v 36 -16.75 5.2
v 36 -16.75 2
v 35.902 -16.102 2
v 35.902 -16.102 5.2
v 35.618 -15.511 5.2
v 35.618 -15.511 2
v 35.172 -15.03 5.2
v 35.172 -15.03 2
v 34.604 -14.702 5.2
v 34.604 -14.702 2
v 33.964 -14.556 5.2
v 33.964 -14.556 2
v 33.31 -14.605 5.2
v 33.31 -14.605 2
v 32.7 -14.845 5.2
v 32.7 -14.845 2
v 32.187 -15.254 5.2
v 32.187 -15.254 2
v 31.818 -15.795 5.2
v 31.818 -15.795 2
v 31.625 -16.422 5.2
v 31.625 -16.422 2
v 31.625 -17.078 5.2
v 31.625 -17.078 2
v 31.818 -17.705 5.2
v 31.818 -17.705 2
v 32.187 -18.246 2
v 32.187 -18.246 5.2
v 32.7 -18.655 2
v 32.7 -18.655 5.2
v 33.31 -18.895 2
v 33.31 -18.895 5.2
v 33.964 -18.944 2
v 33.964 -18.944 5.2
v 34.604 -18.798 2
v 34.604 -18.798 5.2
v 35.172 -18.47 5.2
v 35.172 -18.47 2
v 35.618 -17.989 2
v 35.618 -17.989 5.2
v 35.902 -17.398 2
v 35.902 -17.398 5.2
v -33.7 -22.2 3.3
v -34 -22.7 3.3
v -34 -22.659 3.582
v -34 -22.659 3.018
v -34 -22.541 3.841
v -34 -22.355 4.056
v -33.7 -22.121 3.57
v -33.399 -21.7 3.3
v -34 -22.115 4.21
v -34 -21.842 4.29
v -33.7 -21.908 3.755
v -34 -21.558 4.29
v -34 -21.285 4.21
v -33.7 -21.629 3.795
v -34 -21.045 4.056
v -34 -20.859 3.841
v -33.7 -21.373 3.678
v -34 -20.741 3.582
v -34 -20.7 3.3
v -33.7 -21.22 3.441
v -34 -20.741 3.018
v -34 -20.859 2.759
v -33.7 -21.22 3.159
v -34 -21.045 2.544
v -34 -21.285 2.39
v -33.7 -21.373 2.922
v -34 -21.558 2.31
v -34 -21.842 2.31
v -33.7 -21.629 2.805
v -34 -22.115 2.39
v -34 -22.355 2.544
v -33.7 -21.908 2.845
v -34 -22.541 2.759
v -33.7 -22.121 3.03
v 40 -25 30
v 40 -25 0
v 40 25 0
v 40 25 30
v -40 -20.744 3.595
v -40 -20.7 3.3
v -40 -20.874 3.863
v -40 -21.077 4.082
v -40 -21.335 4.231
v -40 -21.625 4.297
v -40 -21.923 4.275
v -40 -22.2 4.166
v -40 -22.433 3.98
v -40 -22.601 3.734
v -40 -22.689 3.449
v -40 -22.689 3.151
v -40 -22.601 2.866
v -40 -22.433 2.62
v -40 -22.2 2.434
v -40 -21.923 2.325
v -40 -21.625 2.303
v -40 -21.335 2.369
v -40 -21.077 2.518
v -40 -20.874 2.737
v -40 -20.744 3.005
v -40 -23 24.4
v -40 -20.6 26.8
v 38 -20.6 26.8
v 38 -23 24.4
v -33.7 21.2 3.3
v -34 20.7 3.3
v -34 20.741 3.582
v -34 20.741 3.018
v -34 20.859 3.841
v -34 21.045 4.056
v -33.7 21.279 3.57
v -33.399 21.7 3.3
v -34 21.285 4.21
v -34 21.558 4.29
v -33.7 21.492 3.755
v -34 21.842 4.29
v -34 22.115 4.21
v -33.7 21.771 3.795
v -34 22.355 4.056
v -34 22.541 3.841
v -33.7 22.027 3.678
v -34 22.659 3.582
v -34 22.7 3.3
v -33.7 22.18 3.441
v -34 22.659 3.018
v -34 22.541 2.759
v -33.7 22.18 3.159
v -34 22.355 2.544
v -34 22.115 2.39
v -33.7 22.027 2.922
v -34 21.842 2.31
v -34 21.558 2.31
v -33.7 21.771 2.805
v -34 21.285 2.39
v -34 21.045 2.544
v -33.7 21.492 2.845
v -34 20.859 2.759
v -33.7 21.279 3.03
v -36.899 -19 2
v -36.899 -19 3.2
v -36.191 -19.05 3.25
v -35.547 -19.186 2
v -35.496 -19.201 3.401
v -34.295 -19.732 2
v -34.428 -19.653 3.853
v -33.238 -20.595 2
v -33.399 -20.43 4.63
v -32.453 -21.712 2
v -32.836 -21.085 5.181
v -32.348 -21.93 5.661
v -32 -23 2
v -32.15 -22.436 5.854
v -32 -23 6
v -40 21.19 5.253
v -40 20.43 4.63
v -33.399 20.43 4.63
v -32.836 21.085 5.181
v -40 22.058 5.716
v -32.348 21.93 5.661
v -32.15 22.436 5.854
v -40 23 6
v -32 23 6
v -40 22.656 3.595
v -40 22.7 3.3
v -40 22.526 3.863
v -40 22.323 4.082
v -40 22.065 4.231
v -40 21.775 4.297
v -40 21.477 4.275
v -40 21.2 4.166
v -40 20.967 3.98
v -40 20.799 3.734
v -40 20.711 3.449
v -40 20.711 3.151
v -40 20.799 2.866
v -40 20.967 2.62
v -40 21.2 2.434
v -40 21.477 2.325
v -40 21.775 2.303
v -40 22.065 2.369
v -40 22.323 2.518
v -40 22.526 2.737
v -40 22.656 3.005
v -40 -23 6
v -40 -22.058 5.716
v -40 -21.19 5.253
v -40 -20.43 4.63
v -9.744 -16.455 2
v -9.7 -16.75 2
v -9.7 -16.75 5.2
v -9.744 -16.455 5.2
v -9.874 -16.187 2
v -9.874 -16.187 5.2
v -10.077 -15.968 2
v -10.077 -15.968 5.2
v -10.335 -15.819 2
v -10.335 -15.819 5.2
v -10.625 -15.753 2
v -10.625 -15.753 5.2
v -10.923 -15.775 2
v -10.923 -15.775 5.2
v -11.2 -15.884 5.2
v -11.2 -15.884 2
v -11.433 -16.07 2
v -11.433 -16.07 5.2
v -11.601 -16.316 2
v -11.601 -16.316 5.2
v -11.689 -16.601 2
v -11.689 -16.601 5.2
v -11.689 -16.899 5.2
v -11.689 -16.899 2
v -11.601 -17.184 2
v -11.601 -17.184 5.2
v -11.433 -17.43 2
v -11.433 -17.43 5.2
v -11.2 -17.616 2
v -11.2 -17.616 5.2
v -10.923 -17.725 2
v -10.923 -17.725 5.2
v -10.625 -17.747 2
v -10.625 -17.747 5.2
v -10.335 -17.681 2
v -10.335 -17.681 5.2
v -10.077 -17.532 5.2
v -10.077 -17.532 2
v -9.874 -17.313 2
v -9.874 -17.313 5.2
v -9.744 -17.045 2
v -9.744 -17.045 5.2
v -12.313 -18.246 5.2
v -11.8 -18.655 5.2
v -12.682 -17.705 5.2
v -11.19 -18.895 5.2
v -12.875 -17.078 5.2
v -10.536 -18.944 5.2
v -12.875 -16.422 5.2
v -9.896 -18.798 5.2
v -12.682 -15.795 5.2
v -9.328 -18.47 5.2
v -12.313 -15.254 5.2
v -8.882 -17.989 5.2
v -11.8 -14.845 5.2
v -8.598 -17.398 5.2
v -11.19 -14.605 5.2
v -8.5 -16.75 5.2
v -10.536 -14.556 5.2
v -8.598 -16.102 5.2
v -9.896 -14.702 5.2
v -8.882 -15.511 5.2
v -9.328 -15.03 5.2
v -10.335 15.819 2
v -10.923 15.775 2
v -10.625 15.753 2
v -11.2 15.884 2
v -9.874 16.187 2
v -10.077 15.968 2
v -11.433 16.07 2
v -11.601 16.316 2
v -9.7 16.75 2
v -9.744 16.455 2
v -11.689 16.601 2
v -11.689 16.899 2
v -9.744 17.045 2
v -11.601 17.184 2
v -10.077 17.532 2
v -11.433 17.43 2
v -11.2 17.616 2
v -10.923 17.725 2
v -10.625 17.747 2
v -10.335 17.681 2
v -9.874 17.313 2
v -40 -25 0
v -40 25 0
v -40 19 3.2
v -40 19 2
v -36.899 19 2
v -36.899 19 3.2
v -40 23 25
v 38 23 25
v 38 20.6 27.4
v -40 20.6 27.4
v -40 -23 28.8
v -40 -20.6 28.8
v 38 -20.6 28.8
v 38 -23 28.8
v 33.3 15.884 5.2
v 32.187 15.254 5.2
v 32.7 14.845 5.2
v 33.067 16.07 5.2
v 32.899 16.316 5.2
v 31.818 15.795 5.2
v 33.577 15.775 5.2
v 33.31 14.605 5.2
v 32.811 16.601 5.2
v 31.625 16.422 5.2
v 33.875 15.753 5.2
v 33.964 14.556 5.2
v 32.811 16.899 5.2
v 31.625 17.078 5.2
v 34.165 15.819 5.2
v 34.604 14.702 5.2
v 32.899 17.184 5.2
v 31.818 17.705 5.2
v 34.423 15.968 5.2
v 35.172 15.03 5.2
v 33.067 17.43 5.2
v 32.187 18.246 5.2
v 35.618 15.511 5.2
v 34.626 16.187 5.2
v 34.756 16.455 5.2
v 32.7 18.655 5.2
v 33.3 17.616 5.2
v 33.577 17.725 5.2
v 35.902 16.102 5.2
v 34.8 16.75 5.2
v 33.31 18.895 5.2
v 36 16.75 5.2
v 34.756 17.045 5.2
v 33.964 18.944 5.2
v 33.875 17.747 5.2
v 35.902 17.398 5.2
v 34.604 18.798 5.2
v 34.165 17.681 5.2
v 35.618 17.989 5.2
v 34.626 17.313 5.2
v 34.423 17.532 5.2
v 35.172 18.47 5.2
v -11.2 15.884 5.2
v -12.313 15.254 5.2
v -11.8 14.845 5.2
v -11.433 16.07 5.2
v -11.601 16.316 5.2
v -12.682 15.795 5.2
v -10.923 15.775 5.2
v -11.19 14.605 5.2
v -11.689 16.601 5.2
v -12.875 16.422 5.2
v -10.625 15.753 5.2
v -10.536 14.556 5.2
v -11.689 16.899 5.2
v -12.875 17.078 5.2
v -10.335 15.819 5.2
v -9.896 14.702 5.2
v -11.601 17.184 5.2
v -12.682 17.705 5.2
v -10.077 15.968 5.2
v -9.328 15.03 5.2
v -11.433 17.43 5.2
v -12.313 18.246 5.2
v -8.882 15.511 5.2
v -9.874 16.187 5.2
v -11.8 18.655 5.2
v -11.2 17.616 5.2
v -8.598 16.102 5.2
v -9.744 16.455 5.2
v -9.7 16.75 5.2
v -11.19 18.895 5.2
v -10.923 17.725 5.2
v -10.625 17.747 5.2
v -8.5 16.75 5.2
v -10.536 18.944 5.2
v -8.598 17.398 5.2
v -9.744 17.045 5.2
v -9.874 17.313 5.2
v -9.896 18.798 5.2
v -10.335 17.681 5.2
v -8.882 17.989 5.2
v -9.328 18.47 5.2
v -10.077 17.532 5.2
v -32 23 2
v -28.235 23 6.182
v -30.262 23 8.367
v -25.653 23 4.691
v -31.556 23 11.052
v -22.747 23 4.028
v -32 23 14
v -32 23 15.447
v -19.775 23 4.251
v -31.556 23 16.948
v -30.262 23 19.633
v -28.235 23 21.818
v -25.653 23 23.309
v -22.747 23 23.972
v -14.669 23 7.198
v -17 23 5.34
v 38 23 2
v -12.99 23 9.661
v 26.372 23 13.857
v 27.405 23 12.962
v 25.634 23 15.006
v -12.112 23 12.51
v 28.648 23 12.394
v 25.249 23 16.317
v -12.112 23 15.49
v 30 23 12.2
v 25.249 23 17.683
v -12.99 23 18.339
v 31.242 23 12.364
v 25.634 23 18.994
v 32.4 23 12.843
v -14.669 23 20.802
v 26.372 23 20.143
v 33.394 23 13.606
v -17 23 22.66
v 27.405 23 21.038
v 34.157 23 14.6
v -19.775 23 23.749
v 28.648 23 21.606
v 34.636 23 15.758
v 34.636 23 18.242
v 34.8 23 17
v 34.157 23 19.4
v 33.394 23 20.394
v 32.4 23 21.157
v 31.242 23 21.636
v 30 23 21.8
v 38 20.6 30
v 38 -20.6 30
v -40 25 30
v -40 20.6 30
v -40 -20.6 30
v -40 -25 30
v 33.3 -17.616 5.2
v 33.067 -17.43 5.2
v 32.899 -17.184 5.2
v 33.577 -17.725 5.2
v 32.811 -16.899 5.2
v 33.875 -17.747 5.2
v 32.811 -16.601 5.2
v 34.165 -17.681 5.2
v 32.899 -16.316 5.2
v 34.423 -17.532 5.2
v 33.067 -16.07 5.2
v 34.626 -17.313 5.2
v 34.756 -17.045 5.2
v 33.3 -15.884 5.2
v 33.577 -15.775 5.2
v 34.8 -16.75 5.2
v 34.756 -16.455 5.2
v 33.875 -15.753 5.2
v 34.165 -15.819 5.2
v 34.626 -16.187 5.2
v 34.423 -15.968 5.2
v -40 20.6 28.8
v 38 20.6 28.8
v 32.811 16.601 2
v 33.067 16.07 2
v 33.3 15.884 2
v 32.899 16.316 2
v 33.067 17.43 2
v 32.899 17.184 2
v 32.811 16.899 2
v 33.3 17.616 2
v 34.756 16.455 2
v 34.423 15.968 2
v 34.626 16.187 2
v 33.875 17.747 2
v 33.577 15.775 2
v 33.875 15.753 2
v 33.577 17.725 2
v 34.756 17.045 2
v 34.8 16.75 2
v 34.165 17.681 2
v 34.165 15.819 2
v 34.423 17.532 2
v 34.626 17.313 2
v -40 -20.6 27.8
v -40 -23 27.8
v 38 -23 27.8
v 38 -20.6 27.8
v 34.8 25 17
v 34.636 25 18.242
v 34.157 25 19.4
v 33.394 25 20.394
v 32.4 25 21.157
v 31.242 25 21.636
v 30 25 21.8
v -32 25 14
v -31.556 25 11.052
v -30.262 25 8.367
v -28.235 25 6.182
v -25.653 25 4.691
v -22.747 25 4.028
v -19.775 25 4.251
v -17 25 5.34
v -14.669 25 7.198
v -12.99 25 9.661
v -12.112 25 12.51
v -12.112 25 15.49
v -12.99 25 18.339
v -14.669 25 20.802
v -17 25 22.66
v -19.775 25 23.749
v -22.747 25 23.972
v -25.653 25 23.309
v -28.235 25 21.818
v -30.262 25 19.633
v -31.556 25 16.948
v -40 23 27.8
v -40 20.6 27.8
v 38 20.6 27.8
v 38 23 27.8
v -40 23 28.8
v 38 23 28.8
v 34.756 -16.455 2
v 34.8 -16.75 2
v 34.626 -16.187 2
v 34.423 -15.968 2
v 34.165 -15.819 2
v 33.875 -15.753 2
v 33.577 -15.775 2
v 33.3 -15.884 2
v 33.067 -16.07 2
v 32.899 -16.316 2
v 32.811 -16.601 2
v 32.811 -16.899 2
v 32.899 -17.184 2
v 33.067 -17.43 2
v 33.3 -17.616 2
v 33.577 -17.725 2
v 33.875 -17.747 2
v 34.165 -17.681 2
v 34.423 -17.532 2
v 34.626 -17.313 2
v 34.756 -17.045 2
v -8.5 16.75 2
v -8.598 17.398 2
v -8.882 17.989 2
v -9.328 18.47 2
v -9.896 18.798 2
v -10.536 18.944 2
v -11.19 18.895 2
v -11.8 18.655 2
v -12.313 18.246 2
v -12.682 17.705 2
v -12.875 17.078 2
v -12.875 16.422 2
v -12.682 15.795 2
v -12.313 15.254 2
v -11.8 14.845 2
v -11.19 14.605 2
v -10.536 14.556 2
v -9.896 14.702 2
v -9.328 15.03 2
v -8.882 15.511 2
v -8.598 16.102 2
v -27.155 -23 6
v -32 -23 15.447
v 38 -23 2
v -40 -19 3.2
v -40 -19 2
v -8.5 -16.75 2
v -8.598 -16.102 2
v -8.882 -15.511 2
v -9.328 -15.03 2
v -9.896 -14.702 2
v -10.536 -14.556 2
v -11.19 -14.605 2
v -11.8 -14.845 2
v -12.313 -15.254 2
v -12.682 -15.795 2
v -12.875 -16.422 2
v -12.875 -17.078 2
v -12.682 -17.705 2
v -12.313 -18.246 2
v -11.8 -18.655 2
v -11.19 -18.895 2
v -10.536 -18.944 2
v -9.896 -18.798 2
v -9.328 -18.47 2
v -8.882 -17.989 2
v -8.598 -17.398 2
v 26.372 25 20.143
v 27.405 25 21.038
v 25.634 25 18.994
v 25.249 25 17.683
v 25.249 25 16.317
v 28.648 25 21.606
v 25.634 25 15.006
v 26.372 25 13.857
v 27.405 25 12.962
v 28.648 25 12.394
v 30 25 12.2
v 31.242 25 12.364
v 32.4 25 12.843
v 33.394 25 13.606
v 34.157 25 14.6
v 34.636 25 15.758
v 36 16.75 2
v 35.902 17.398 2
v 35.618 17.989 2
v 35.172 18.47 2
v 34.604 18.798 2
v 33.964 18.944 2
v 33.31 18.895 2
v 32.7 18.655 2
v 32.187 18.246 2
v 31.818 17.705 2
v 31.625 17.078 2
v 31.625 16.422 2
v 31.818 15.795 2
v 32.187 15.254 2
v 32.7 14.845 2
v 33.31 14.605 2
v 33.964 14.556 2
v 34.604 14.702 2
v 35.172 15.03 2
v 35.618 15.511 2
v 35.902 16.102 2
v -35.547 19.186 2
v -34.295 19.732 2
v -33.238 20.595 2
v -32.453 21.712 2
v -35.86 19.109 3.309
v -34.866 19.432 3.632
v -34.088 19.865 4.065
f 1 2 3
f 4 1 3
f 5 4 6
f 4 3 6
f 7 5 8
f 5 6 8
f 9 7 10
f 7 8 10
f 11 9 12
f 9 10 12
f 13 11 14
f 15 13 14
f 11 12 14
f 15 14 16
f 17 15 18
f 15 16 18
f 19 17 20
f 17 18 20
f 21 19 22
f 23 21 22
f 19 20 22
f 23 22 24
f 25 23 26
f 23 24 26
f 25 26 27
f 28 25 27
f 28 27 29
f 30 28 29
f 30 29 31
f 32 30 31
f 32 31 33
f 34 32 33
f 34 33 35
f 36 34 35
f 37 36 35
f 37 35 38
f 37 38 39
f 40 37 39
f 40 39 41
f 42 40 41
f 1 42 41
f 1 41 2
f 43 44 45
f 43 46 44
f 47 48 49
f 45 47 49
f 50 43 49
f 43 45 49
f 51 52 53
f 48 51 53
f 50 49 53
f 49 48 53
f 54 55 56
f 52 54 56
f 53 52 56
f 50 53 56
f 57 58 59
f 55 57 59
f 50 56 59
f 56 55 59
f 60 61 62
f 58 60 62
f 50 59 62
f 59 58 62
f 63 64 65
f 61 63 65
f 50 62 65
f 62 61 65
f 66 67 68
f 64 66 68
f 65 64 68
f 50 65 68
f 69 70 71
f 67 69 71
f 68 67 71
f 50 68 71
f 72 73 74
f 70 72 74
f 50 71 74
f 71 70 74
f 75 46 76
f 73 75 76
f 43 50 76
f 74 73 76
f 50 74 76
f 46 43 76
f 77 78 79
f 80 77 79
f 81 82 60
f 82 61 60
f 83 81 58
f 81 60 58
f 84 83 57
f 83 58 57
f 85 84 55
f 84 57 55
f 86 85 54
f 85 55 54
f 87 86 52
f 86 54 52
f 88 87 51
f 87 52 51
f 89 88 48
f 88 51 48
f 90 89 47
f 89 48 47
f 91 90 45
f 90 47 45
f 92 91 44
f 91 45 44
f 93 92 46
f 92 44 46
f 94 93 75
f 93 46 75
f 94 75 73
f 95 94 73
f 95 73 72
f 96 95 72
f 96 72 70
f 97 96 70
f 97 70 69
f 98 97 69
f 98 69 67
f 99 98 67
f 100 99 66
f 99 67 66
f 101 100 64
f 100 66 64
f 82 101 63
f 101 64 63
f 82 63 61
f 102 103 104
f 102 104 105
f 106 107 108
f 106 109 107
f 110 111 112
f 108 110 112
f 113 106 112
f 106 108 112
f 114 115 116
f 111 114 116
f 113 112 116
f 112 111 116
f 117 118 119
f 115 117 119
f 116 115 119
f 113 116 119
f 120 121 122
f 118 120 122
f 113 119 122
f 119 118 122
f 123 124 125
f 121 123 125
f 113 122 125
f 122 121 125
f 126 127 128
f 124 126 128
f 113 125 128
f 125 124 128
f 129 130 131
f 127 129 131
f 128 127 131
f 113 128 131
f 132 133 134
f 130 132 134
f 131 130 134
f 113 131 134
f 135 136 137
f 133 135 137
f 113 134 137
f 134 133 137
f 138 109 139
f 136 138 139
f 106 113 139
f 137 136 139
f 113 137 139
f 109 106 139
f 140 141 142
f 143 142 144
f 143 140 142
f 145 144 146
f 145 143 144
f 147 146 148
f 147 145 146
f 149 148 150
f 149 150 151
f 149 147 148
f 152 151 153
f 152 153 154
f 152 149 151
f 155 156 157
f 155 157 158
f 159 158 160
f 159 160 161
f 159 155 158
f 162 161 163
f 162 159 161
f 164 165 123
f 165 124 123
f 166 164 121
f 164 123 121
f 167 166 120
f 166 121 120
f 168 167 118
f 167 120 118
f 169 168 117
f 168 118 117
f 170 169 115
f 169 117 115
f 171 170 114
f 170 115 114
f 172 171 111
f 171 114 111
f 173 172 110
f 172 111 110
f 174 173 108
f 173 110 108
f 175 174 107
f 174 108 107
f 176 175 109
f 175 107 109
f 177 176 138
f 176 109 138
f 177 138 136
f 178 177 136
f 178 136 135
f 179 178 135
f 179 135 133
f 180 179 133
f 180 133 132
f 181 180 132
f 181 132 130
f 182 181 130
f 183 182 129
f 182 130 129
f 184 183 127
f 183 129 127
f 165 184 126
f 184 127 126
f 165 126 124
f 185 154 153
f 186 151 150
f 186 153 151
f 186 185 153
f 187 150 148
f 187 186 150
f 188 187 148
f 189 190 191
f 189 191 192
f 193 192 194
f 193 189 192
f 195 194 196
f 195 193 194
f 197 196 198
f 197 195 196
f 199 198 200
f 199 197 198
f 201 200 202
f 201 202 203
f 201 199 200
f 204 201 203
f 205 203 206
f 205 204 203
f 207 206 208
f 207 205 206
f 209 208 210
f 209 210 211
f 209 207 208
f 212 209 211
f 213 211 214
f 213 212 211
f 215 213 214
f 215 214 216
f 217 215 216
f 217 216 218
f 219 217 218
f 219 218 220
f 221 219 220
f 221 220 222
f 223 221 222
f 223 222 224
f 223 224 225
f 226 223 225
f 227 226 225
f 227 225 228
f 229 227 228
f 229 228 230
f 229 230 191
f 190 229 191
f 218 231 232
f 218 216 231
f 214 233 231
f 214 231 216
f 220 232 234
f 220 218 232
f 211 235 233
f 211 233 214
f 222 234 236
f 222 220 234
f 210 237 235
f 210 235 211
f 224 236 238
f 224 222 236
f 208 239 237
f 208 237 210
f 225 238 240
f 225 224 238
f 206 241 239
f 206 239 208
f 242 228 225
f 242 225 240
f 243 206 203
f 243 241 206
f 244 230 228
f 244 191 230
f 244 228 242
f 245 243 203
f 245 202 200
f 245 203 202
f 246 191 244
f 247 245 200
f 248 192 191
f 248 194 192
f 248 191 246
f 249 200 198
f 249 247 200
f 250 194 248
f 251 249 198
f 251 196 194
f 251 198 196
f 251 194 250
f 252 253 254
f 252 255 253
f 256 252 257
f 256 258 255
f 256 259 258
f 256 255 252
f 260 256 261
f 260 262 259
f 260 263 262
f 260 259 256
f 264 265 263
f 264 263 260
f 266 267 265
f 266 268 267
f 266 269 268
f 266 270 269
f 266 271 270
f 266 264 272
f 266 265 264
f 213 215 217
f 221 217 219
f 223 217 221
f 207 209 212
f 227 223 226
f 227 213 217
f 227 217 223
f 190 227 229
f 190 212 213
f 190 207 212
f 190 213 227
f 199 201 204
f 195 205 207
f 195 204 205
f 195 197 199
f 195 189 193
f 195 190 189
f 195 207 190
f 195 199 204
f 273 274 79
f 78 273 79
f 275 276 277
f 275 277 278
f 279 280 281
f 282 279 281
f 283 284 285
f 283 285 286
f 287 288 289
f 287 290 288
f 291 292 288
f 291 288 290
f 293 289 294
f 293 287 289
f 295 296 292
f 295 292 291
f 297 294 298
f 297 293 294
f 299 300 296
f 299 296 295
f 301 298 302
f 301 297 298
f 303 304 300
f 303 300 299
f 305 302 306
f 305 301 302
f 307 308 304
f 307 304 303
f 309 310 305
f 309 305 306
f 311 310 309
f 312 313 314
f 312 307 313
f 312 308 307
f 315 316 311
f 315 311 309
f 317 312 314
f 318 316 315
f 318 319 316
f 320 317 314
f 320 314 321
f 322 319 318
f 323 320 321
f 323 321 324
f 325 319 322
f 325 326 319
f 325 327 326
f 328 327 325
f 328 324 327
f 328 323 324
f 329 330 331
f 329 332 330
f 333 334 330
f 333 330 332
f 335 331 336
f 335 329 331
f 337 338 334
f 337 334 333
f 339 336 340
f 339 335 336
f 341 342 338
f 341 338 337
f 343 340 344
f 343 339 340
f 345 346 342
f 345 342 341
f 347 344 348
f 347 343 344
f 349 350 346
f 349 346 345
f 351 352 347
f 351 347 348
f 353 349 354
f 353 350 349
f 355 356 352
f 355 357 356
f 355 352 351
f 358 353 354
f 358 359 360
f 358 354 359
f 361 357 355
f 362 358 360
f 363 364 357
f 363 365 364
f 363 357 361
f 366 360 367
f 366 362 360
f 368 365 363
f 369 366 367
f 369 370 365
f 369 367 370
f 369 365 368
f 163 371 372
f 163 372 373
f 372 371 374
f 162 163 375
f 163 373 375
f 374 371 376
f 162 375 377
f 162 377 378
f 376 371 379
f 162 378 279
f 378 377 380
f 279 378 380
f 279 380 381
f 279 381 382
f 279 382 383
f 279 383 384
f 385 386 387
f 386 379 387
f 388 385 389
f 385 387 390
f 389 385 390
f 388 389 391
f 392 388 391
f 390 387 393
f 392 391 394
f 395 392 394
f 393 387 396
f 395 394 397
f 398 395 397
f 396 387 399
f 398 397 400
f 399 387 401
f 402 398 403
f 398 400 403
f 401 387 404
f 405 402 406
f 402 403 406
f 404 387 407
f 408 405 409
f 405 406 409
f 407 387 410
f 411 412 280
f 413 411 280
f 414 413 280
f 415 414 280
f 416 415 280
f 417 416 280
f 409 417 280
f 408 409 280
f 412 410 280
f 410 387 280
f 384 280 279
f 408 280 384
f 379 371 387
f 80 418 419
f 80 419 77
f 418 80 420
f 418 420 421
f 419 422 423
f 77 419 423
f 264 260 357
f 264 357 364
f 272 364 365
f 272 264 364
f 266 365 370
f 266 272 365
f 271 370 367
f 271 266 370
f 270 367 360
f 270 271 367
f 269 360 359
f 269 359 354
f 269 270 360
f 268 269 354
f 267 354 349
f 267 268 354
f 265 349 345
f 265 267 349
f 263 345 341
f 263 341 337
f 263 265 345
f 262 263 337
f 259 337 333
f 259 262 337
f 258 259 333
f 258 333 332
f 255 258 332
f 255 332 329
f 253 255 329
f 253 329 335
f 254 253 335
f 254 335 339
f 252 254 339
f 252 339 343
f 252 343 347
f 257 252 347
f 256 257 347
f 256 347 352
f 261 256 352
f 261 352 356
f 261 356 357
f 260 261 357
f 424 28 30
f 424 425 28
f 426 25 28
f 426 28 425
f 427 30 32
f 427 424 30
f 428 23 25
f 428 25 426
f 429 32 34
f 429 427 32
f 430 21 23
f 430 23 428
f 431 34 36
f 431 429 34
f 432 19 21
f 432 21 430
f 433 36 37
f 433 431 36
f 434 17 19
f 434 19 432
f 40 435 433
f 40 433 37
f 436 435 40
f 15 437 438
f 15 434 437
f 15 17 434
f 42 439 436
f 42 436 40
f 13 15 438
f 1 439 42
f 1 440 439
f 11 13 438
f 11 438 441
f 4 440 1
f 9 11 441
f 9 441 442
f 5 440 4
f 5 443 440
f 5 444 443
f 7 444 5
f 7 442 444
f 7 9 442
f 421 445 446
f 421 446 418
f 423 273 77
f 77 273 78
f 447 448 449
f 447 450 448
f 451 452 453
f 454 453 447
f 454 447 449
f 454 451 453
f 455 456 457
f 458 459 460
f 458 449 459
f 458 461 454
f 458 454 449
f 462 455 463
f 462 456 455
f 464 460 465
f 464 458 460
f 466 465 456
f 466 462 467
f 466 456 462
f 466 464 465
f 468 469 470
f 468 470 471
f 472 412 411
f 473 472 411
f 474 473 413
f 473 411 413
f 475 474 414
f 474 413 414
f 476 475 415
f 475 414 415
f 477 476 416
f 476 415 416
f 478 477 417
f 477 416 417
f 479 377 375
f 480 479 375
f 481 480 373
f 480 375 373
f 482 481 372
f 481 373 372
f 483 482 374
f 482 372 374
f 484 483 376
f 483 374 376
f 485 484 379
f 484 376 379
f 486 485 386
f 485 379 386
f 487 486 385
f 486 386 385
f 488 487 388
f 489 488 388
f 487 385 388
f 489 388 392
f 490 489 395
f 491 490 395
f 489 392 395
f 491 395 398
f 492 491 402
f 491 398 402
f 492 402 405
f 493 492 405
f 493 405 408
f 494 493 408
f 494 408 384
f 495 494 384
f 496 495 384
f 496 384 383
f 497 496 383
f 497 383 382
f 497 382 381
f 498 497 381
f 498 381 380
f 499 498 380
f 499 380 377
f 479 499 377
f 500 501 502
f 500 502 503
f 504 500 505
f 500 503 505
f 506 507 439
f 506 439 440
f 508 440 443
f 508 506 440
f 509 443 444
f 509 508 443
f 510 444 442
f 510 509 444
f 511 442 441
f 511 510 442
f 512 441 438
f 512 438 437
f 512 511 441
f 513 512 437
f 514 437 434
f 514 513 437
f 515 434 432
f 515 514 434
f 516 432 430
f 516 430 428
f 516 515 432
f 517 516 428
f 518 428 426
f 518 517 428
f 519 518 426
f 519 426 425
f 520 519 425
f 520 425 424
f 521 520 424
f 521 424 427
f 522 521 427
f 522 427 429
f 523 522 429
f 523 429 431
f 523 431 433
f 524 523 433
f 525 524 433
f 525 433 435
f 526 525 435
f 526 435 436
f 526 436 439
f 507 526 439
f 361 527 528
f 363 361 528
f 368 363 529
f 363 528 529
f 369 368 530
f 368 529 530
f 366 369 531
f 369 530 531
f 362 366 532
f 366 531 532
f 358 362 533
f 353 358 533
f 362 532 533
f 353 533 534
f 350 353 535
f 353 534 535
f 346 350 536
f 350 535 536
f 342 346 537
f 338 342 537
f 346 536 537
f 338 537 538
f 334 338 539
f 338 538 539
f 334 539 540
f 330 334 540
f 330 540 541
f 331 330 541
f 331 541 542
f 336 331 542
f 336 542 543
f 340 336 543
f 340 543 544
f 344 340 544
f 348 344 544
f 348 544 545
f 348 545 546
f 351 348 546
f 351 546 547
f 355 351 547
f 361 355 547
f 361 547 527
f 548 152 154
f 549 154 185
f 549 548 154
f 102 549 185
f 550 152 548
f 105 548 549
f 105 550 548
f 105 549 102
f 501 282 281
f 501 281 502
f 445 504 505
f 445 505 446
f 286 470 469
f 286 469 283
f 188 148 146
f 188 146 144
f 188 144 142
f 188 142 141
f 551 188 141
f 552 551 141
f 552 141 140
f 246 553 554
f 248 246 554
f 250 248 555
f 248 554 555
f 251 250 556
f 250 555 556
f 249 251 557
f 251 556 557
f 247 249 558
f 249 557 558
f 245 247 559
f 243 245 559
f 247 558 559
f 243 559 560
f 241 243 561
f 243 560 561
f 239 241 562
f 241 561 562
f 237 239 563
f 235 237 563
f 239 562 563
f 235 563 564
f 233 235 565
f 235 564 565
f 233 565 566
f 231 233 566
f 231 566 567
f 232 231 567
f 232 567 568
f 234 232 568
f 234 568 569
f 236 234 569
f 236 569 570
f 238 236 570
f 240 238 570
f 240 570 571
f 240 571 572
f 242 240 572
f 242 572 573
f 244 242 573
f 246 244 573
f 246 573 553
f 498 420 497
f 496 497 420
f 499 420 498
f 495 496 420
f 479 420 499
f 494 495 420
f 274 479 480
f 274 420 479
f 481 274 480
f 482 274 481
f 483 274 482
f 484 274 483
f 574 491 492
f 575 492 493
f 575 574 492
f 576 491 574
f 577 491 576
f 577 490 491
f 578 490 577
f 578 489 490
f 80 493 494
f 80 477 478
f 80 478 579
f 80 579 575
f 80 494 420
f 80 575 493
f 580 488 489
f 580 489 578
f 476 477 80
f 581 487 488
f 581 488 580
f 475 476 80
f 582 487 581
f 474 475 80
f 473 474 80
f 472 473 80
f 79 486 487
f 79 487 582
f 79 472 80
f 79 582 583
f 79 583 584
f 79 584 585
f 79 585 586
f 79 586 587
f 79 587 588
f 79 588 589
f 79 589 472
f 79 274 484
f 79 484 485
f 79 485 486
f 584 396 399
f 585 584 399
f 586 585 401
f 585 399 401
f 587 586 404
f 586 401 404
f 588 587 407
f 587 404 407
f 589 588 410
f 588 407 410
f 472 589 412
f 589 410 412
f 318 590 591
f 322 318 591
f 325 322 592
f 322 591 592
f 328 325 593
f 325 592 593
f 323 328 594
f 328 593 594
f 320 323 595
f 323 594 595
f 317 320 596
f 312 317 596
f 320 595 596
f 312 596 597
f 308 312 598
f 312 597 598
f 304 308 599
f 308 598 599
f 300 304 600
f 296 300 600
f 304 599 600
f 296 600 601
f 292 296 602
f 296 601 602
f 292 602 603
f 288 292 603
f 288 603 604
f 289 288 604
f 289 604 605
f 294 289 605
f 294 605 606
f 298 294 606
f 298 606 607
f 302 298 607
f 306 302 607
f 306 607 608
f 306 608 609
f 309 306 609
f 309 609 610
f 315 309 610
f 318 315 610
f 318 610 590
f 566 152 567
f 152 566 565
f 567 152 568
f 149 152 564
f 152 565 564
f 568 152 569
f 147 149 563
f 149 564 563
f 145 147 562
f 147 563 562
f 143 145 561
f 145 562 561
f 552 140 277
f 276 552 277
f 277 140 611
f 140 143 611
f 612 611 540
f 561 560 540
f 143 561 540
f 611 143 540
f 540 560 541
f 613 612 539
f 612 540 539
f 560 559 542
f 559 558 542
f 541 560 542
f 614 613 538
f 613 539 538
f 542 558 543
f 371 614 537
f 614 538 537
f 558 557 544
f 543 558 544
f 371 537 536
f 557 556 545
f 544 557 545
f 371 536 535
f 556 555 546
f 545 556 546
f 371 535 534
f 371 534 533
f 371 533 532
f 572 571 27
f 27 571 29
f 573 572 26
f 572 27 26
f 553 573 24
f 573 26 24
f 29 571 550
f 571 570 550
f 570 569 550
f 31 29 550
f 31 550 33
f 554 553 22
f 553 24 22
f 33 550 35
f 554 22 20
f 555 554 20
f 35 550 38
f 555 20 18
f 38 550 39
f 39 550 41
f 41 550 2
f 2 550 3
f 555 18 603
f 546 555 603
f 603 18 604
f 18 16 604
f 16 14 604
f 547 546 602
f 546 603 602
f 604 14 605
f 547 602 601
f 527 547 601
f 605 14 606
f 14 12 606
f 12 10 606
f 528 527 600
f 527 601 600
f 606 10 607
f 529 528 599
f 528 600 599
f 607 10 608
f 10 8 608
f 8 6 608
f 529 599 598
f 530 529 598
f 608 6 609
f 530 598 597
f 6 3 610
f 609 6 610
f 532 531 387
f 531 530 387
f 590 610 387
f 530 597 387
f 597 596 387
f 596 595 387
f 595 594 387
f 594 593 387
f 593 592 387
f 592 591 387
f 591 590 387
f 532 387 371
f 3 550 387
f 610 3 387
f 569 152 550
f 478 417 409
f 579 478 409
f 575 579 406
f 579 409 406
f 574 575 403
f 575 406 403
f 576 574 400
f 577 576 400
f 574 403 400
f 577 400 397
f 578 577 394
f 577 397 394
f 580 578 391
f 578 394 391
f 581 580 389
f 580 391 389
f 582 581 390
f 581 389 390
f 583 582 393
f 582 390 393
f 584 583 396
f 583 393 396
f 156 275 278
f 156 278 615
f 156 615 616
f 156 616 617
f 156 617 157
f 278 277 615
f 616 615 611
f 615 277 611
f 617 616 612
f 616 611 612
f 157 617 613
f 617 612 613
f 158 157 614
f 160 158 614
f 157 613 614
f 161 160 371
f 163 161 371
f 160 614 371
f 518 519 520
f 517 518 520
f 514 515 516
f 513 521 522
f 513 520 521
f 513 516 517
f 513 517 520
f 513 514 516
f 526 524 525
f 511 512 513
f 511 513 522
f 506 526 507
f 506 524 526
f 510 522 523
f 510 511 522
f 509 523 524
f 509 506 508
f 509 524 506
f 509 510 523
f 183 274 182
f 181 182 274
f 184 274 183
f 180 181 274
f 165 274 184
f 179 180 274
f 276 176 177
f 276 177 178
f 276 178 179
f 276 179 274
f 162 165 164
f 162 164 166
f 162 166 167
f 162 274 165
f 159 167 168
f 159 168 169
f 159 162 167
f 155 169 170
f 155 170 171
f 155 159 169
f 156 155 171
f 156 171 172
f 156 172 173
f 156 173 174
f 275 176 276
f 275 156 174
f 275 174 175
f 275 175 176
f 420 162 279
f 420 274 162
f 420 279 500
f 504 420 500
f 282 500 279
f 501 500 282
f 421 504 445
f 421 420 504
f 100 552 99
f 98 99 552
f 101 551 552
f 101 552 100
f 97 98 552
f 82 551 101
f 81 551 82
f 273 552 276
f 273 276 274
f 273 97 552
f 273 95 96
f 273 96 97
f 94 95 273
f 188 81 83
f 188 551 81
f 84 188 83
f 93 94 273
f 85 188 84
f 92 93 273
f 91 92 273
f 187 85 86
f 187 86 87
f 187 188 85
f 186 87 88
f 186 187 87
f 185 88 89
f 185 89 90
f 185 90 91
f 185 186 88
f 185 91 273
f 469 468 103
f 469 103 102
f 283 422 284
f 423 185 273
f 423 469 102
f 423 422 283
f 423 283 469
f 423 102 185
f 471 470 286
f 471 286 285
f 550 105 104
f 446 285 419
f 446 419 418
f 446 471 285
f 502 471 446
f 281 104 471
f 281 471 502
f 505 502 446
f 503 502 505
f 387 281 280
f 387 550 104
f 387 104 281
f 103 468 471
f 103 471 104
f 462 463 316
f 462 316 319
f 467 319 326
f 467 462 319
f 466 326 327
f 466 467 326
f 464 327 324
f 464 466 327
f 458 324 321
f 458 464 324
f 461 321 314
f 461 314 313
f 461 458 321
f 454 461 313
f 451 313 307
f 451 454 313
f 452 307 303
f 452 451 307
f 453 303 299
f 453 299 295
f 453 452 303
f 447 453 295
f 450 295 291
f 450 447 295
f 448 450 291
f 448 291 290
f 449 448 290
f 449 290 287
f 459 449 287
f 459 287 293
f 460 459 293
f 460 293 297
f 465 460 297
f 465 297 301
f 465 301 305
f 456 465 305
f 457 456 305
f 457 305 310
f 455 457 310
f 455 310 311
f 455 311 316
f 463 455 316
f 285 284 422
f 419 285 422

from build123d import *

# Parameters (mm, degrees)
F0_W         = 80
F0_H         = 50
F1_DEPTH     = 30
F2_T         = -2
F3_R         = 2.2
F3_R_2       = 1
F4_DEPTH     = 5.2
F5_W         = 46
F5_H         = 28
F6_DEPTH     = 25
F7_W         = 2.4
F7_H         = 1.2
F8_DEPTH     = 78
F10_DEPTH    = 8
F11_T1_DEPTH = 13.4474487139
F11_T3_DEPTH = 17.690486541
F12_D        = 2
F12_DEPTH    = 6
F12_TIP      = 0.600860619
F14_DEPTH    = 25


# Not quite as in the source:
# - a fillet or chamfer that OpenCascade refuses, or shapes differently, is made with other operations: its cross-section is extruded or revolved along the edge and cut away or added


with BuildPart() as f1:
    # F0 (on Top) → F1 (new body)
    with BuildSketch(Plane.XY):
        Rectangle(F0_W, F0_H)
    extrude(amount=F1_DEPTH)

    # F2
    f2_openings = [f1.faces().sort_by_distance(p)[0] for p in [
        (0, 0, 30),
    ]]
    offset(amount=F2_T, openings=f2_openings)

    # F3 (on face) → F4 (join)
    with BuildSketch(Plane.XY):
        with Locations((-10.7, 16.75)):
            Circle(F3_R)
        with Locations((-10.7, 16.75)):
            Circle(F3_R_2, mode=Mode.SUBTRACT)
        with Locations((-10.7, -16.75)):
            Circle(F3_R)
        with Locations((-10.7, -16.75)):
            Circle(F3_R_2, mode=Mode.SUBTRACT)
        with Locations((33.8, 16.75)):
            Circle(F3_R)
        with Locations((33.8, 16.75)):
            Circle(F3_R_2, mode=Mode.SUBTRACT)
        with Locations((33.8, -16.75)):
            Circle(F3_R)
        with Locations((33.8, -16.75)):
            Circle(F3_R_2, mode=Mode.SUBTRACT)
    extrude(amount=F4_DEPTH)

    # F5 (on face) → F6 (cut)
    with BuildSketch(Plane.YZ.offset(-38)):
        with Locations((0, 16)):
            Rectangle(F5_W, F5_H)
    extrude(amount=-F6_DEPTH, mode=Mode.SUBTRACT)

    # F7 (on face) → F8 (join, through all)
    with BuildSketch(Plane(origin=(-40, 0, 0), x_dir=(0, -1, 0), z_dir=(-1, 0, 0))):
        Polygon((-20.6, 27.8), (-23, 27.8), (-23, 25), (-20.6, 27.4), align=None)
        Polygon((20.6, 26.8), (23, 24.4), (23, 27.8), (20.6, 27.8), align=None)
        with Locations((21.8, 29.4)):
            Rectangle(F7_W, F7_H)
        with Locations((-21.8, 29.4)):
            Rectangle(F7_W, F7_H)
    extrude(amount=-F8_DEPTH)

    # F9 (on face) → F10 (join)
    with BuildSketch(Plane(origin=(-40, 0, 0), x_dir=(0, -1, 0), z_dir=(-1, 0, 0))):
        Polygon((-21.7, 3.3), (-23, 2), (-19, 2), (-19, 3.2), (-20.4, 4.6), align=None)
        Polygon((-23, 6), (-23, 2), (-21.7, 3.3), (-20.4, 4.6), (-21.8, 6), align=None)
        Polygon((19, 2), (23, 2), (23, 6), (21.8, 6), (19, 3.2), align=None)
    extrude(amount=-F10_DEPTH)

    # F11: fillet of radius 5 on 4 edges, made by hand

    # F11_s2 → F11_t1 (cut)
    with BuildSketch(Plane.XY.offset(2)):
        with BuildLine():
            ThreePointArc((-36.8989794856, 19), (-33.7367018254, 20.1270166538), (-32, 23))
            Line((-32, 23), (-32, 19))
            Line((-32, 19), (-36.8989794856, 19))
        make_face()
        with BuildLine():
            ThreePointArc((-36.8989794856, -19), (-33.7367018254, -20.1270166538), (-32, -23))
            Line((-32, -23), (-32, -19))
            Line((-32, -19), (-36.8989794856, -19))
        make_face()
    extrude(amount=F11_T1_DEPTH, mode=Mode.SUBTRACT)

    # F11_s4 → F11_t3 (cut)
    with BuildSketch(Plane.YZ.offset(-44.8452432705)):
        with BuildLine():
            ThreePointArc((-23, 6), (-21.6127664169, 5.5061172285), (-20.4295582508, 4.6295582508))
            Line((-20.4295582508, 4.6295582508), (-21.8, 6))
            Line((-21.8, 6), (-23, 6))
        make_face()
        with BuildLine():
            ThreePointArc((20.4295582508, 4.6295582508), (21.6127664169, 5.5061172285), (23, 6))
            Line((23, 6), (21.8, 6))
            Line((21.8, 6), (20.4295582508, 4.6295582508))
        make_face()
    extrude(amount=F11_T3_DEPTH, mode=Mode.SUBTRACT)

    # F12
    with Locations(Plane(origin=(-40, 0, 0), x_dir=(0, -1, 0), z_dir=(-1, 0, 0))):
        with Locations((-21.7, 3.3), (21.7, 3.3)):
            Hole(F12_D / 2, depth=F12_DEPTH)
            with Locations((0, 0, -(F12_DEPTH + F12_TIP / 2))):  # 118° drill point
                Cone(0, F12_D / 2, F12_TIP, mode=Mode.SUBTRACT)

    # F13 (on face) → F14 (cut)
    with BuildSketch(Plane.XZ.offset(-23)):
        with BuildLine():
            ThreePointArc((-28, 6), (-17.527864045, 5.05572809), (-12, 14))
            ThreePointArc((-12, 14), (-22, 24), (-32, 14))
            ThreePointArc((-32, 14), (-30.94427191, 9.527864045), (-28, 6))
        make_face()
        with BuildLine():
            ThreePointArc((30, 21.8), (25.2, 17), (30, 12.2))
            Line((30, 12.2), (30, 17))
            Line((30, 17), (30, 21.8))
        make_face()
        with BuildLine():
            ThreePointArc((34.8, 17), (33.3941125497, 20.3941125497), (30, 21.8))
            Line((30, 21.8), (30, 17))
            Line((30, 17), (34.8, 17))
        make_face()
        with BuildLine():
            Line((30, 17), (30, 12.2))
            ThreePointArc((30, 12.2), (33.3941125497, 13.6058874503), (34.8, 17))
            Line((34.8, 17), (30, 17))
        make_face()
    extrude(amount=-F14_DEPTH, mode=Mode.SUBTRACT)


solid = f1.part
